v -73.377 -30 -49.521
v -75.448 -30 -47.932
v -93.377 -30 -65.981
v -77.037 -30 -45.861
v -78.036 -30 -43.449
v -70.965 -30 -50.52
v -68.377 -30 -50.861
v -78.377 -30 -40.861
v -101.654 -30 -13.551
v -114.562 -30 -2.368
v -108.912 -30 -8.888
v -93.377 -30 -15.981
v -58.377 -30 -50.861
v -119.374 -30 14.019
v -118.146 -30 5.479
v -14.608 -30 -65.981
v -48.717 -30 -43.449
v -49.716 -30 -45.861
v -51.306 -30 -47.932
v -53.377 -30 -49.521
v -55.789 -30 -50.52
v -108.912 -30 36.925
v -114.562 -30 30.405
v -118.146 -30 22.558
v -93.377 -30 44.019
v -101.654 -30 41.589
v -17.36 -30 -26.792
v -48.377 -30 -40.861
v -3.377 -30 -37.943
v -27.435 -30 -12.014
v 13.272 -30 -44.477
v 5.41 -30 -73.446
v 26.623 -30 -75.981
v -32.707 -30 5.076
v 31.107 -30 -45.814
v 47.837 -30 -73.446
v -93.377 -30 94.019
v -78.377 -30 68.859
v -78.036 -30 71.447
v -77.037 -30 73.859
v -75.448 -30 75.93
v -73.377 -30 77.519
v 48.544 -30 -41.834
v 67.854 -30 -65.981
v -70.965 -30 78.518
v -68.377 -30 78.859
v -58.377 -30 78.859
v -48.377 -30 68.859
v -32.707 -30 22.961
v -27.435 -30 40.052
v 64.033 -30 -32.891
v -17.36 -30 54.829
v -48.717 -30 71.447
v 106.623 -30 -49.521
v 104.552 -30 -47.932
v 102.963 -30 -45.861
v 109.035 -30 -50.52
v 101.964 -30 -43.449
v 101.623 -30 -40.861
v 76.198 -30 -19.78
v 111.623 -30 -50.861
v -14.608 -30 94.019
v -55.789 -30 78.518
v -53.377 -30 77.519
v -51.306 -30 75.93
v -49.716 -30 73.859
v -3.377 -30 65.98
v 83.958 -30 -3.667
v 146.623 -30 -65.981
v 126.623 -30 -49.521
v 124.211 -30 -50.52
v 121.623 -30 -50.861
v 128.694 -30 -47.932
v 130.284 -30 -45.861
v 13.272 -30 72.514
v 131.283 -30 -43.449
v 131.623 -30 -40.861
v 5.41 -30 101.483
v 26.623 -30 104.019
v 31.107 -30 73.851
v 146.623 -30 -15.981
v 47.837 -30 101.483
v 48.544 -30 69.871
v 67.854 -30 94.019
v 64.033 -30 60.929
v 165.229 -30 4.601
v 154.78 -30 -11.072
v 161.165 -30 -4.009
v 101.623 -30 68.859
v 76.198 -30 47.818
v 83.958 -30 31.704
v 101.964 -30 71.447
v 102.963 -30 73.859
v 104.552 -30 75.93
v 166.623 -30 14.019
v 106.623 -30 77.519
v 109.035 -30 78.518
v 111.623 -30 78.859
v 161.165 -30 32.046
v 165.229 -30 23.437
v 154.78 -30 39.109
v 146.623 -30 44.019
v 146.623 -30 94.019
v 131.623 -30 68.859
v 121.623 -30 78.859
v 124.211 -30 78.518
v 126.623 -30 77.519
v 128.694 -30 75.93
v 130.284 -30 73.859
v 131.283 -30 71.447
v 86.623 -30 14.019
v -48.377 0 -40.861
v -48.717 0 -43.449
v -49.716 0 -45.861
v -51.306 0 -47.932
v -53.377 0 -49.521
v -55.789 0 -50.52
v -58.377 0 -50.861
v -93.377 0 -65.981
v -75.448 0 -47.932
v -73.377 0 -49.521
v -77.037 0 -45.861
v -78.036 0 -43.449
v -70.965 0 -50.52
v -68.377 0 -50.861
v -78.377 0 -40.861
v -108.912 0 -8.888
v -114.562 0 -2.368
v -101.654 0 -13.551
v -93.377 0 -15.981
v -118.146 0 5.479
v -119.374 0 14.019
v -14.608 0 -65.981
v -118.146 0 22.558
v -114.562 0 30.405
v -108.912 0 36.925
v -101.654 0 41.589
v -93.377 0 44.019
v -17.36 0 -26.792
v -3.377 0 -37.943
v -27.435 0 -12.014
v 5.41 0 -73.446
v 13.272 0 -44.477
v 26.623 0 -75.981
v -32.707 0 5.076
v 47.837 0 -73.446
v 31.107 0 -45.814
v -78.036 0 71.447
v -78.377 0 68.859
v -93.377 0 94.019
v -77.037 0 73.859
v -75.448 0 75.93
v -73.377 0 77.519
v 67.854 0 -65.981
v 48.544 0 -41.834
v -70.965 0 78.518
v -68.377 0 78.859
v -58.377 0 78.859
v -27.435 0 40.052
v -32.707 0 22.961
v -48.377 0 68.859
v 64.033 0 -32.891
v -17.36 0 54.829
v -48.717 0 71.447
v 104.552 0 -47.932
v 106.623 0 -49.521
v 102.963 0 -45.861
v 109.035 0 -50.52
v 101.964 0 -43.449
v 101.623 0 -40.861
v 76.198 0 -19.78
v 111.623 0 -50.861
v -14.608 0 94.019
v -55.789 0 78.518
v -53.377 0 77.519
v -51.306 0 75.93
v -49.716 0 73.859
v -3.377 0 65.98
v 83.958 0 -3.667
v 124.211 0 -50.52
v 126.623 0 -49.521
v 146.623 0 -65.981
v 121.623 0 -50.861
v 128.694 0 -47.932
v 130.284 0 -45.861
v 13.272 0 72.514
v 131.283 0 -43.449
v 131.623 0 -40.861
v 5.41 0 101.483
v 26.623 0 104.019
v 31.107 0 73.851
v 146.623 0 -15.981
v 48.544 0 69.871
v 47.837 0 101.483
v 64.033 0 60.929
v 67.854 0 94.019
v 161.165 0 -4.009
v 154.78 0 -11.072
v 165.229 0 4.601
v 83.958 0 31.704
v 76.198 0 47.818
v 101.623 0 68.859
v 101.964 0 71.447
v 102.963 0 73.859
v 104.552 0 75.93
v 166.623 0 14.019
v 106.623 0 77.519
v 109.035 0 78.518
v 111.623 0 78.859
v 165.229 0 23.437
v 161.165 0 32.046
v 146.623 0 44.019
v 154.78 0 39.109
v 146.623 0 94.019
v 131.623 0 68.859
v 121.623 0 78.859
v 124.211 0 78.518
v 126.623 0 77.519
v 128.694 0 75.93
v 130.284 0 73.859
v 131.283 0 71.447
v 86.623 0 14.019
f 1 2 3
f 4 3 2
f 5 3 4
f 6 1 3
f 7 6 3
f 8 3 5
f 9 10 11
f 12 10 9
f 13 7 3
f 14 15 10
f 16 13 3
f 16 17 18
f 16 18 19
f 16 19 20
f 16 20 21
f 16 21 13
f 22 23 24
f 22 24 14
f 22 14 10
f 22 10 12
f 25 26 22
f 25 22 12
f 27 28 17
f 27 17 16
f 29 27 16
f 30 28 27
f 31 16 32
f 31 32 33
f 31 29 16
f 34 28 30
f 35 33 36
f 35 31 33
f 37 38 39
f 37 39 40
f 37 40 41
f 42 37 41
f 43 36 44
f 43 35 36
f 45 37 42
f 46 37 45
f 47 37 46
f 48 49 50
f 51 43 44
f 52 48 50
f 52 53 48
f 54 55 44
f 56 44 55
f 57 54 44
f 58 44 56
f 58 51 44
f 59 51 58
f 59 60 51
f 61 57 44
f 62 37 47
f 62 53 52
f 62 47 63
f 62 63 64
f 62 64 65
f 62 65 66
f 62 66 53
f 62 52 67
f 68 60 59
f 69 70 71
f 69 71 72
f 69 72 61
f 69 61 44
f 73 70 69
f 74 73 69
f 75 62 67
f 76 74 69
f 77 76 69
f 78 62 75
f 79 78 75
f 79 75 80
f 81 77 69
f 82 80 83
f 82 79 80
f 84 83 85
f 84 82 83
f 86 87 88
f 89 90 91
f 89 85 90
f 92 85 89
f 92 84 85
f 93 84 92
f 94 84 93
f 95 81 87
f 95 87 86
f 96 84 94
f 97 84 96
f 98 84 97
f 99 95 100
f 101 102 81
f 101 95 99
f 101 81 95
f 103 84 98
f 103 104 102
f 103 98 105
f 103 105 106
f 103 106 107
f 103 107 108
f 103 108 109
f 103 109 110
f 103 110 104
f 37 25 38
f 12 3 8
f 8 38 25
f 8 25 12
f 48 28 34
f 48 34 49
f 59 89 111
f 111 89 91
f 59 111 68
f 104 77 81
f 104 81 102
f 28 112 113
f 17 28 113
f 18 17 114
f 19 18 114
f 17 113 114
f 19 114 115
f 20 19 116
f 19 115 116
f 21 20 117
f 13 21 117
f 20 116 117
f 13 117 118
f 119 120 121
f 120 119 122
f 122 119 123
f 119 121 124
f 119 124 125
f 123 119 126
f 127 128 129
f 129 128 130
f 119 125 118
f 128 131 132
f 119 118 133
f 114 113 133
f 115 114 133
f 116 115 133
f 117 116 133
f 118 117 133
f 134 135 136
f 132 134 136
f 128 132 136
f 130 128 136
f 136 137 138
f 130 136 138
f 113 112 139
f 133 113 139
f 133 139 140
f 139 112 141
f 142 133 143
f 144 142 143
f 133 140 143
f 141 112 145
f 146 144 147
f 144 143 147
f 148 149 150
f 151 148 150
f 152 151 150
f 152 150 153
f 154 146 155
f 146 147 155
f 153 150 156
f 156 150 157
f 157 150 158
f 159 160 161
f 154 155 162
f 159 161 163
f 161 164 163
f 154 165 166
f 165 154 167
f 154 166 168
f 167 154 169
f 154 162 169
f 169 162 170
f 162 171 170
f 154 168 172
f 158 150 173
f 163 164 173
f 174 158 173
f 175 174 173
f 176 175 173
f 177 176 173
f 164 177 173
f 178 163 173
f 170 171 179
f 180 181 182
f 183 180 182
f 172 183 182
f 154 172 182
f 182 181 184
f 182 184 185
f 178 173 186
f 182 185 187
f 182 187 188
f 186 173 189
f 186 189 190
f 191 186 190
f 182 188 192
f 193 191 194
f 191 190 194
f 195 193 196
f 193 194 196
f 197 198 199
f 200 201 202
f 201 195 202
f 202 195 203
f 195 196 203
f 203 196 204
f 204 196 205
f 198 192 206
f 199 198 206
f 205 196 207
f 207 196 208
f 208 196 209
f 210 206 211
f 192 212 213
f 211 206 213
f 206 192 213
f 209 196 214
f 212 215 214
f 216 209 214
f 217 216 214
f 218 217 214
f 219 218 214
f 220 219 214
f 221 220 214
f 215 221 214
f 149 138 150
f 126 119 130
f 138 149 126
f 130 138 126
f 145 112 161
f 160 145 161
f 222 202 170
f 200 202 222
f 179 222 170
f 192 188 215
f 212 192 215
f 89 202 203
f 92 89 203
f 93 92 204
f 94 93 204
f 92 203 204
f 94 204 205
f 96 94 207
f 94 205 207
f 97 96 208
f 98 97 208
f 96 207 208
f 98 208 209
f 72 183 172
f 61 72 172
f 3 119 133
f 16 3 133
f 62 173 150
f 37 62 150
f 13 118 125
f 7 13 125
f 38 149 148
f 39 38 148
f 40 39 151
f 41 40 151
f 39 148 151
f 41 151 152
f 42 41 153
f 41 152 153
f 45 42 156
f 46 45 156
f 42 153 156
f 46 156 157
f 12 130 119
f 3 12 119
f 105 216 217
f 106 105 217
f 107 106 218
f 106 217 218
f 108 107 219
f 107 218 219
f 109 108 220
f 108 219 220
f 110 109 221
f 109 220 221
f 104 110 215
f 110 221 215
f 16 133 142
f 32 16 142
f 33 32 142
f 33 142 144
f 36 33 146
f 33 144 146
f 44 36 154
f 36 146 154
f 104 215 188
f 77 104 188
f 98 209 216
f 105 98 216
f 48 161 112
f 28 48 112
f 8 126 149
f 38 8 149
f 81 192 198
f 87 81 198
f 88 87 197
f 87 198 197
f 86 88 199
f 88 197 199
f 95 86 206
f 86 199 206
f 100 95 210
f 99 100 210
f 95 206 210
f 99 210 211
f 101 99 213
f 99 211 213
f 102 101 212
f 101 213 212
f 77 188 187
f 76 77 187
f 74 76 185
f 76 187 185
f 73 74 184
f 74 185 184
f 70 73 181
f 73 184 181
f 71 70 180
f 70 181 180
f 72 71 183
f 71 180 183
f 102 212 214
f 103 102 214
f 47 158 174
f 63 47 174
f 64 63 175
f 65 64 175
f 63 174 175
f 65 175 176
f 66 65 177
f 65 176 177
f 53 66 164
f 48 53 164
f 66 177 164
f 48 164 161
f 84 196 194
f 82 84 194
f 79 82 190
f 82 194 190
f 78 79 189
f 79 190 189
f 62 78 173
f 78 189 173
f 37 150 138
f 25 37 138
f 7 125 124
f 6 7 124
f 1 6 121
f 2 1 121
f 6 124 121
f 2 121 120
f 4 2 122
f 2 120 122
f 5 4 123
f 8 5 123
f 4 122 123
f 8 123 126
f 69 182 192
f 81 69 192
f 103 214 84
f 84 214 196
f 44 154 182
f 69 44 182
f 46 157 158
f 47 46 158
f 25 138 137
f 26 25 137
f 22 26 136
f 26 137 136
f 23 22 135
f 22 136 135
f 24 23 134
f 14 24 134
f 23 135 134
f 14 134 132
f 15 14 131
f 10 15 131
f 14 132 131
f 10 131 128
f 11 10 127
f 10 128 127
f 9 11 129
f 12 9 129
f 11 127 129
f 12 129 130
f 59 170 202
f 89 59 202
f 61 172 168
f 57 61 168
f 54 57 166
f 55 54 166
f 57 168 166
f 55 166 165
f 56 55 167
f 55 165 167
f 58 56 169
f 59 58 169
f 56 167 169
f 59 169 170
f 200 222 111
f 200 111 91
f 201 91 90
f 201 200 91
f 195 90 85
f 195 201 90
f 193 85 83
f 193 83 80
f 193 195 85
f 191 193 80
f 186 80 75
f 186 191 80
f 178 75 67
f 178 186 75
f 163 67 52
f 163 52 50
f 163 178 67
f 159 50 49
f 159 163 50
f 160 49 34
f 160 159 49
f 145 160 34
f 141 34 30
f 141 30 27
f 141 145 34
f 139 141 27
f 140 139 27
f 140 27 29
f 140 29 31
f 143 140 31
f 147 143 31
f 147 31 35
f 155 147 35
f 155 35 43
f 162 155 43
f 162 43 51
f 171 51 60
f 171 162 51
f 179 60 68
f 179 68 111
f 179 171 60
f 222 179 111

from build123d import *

# Parameters (mm, degrees)
F0_R     = 60
F1_DEPTH = 30


with BuildPart() as f1:
    # F0 (on Front) → F1 (new body)
    with BuildSketch(Plane.XZ):
        with BuildLine():
            Line((-23.376703, 94.018714), (-93.376703, 94.018714))
            Line((-93.376703, 94.018714), (-93.376703, 44.018714))
            ThreePointArc((-93.376703, 44.018714), (-119.373909, 14.018714), (-93.376703, -15.981286))
            Line((-93.376703, -15.981286), (-93.376703, -65.981286))
            Line((-93.376703, -65.981286), (-23.376703, -65.981286))
            Line((-23.376703, -65.981286), (-14.60776, -65.981286))
            ThreePointArc((-14.60776, -65.981286), (26.623297, -75.981286), (67.854353, -65.981286))
            Line((67.854353, -65.981286), (76.623297, -65.981286))
            Line((76.623297, -65.981286), (146.623297, -65.981286))
            Line((146.623297, -65.981286), (146.623297, -15.981286))
            ThreePointArc((146.623297, -15.981286), (166.623297, 14.018714), (146.623297, 44.018714))
            Line((146.623297, 44.018714), (146.623297, 94.018714))
            Line((146.623297, 94.018714), (76.623297, 94.018714))
            Line((76.623297, 94.018714), (67.854353, 94.018714))
            ThreePointArc((67.854353, 94.018714), (26.623297, 104.018714), (-14.60776, 94.018714))
            Line((-14.60776, 94.018714), (-23.376703, 94.018714))
        make_face()
        with BuildLine():
            ThreePointArc((-78.376703, 68.858823), (-75.447771, 75.92989), (-68.376703, 78.858823))
            Line((-68.376703, 78.858823), (-58.376703, 78.858823))
            ThreePointArc((-58.376703, 78.858823), (-51.305635, 75.92989), (-48.376703, 68.858823))
            Line((-48.376703, 68.858823), (-48.376703, -40.861128))
            ThreePointArc((-48.376703, -40.861128), (-51.305635, -47.932195), (-58.376703, -50.861128))
            Line((-58.376703, -50.861128), (-68.376703, -50.861128))
            ThreePointArc((-68.376703, -50.861128), (-75.447771, -47.932195), (-78.376703, -40.861128))
            Line((-78.376703, -40.861128), (-78.376703, 68.858823))
        make_face(mode=Mode.SUBTRACT)
        with BuildLine():
            ThreePointArc((101.623297, 68.858823), (104.552229, 75.92989), (111.623297, 78.858823))
            Line((111.623297, 78.858823), (121.623297, 78.858823))
            ThreePointArc((121.623297, 78.858823), (128.694365, 75.92989), (131.623297, 68.858823))
            Line((131.623297, 68.858823), (131.623297, -40.861128))
            ThreePointArc((131.623297, -40.861128), (128.694365, -47.932195), (121.623297, -50.861128))
            Line((121.623297, -50.861128), (111.623297, -50.861128))
            ThreePointArc((111.623297, -50.861128), (104.552229, -47.932195), (101.623297, -40.861128))
            Line((101.623297, -40.861128), (101.623297, 68.858823))
        make_face(mode=Mode.SUBTRACT)
        with Locations((26.623297, 14.018714)):
            Circle(F0_R, mode=Mode.SUBTRACT)
    extrude(amount=F1_DEPTH)


solid = f1.part
